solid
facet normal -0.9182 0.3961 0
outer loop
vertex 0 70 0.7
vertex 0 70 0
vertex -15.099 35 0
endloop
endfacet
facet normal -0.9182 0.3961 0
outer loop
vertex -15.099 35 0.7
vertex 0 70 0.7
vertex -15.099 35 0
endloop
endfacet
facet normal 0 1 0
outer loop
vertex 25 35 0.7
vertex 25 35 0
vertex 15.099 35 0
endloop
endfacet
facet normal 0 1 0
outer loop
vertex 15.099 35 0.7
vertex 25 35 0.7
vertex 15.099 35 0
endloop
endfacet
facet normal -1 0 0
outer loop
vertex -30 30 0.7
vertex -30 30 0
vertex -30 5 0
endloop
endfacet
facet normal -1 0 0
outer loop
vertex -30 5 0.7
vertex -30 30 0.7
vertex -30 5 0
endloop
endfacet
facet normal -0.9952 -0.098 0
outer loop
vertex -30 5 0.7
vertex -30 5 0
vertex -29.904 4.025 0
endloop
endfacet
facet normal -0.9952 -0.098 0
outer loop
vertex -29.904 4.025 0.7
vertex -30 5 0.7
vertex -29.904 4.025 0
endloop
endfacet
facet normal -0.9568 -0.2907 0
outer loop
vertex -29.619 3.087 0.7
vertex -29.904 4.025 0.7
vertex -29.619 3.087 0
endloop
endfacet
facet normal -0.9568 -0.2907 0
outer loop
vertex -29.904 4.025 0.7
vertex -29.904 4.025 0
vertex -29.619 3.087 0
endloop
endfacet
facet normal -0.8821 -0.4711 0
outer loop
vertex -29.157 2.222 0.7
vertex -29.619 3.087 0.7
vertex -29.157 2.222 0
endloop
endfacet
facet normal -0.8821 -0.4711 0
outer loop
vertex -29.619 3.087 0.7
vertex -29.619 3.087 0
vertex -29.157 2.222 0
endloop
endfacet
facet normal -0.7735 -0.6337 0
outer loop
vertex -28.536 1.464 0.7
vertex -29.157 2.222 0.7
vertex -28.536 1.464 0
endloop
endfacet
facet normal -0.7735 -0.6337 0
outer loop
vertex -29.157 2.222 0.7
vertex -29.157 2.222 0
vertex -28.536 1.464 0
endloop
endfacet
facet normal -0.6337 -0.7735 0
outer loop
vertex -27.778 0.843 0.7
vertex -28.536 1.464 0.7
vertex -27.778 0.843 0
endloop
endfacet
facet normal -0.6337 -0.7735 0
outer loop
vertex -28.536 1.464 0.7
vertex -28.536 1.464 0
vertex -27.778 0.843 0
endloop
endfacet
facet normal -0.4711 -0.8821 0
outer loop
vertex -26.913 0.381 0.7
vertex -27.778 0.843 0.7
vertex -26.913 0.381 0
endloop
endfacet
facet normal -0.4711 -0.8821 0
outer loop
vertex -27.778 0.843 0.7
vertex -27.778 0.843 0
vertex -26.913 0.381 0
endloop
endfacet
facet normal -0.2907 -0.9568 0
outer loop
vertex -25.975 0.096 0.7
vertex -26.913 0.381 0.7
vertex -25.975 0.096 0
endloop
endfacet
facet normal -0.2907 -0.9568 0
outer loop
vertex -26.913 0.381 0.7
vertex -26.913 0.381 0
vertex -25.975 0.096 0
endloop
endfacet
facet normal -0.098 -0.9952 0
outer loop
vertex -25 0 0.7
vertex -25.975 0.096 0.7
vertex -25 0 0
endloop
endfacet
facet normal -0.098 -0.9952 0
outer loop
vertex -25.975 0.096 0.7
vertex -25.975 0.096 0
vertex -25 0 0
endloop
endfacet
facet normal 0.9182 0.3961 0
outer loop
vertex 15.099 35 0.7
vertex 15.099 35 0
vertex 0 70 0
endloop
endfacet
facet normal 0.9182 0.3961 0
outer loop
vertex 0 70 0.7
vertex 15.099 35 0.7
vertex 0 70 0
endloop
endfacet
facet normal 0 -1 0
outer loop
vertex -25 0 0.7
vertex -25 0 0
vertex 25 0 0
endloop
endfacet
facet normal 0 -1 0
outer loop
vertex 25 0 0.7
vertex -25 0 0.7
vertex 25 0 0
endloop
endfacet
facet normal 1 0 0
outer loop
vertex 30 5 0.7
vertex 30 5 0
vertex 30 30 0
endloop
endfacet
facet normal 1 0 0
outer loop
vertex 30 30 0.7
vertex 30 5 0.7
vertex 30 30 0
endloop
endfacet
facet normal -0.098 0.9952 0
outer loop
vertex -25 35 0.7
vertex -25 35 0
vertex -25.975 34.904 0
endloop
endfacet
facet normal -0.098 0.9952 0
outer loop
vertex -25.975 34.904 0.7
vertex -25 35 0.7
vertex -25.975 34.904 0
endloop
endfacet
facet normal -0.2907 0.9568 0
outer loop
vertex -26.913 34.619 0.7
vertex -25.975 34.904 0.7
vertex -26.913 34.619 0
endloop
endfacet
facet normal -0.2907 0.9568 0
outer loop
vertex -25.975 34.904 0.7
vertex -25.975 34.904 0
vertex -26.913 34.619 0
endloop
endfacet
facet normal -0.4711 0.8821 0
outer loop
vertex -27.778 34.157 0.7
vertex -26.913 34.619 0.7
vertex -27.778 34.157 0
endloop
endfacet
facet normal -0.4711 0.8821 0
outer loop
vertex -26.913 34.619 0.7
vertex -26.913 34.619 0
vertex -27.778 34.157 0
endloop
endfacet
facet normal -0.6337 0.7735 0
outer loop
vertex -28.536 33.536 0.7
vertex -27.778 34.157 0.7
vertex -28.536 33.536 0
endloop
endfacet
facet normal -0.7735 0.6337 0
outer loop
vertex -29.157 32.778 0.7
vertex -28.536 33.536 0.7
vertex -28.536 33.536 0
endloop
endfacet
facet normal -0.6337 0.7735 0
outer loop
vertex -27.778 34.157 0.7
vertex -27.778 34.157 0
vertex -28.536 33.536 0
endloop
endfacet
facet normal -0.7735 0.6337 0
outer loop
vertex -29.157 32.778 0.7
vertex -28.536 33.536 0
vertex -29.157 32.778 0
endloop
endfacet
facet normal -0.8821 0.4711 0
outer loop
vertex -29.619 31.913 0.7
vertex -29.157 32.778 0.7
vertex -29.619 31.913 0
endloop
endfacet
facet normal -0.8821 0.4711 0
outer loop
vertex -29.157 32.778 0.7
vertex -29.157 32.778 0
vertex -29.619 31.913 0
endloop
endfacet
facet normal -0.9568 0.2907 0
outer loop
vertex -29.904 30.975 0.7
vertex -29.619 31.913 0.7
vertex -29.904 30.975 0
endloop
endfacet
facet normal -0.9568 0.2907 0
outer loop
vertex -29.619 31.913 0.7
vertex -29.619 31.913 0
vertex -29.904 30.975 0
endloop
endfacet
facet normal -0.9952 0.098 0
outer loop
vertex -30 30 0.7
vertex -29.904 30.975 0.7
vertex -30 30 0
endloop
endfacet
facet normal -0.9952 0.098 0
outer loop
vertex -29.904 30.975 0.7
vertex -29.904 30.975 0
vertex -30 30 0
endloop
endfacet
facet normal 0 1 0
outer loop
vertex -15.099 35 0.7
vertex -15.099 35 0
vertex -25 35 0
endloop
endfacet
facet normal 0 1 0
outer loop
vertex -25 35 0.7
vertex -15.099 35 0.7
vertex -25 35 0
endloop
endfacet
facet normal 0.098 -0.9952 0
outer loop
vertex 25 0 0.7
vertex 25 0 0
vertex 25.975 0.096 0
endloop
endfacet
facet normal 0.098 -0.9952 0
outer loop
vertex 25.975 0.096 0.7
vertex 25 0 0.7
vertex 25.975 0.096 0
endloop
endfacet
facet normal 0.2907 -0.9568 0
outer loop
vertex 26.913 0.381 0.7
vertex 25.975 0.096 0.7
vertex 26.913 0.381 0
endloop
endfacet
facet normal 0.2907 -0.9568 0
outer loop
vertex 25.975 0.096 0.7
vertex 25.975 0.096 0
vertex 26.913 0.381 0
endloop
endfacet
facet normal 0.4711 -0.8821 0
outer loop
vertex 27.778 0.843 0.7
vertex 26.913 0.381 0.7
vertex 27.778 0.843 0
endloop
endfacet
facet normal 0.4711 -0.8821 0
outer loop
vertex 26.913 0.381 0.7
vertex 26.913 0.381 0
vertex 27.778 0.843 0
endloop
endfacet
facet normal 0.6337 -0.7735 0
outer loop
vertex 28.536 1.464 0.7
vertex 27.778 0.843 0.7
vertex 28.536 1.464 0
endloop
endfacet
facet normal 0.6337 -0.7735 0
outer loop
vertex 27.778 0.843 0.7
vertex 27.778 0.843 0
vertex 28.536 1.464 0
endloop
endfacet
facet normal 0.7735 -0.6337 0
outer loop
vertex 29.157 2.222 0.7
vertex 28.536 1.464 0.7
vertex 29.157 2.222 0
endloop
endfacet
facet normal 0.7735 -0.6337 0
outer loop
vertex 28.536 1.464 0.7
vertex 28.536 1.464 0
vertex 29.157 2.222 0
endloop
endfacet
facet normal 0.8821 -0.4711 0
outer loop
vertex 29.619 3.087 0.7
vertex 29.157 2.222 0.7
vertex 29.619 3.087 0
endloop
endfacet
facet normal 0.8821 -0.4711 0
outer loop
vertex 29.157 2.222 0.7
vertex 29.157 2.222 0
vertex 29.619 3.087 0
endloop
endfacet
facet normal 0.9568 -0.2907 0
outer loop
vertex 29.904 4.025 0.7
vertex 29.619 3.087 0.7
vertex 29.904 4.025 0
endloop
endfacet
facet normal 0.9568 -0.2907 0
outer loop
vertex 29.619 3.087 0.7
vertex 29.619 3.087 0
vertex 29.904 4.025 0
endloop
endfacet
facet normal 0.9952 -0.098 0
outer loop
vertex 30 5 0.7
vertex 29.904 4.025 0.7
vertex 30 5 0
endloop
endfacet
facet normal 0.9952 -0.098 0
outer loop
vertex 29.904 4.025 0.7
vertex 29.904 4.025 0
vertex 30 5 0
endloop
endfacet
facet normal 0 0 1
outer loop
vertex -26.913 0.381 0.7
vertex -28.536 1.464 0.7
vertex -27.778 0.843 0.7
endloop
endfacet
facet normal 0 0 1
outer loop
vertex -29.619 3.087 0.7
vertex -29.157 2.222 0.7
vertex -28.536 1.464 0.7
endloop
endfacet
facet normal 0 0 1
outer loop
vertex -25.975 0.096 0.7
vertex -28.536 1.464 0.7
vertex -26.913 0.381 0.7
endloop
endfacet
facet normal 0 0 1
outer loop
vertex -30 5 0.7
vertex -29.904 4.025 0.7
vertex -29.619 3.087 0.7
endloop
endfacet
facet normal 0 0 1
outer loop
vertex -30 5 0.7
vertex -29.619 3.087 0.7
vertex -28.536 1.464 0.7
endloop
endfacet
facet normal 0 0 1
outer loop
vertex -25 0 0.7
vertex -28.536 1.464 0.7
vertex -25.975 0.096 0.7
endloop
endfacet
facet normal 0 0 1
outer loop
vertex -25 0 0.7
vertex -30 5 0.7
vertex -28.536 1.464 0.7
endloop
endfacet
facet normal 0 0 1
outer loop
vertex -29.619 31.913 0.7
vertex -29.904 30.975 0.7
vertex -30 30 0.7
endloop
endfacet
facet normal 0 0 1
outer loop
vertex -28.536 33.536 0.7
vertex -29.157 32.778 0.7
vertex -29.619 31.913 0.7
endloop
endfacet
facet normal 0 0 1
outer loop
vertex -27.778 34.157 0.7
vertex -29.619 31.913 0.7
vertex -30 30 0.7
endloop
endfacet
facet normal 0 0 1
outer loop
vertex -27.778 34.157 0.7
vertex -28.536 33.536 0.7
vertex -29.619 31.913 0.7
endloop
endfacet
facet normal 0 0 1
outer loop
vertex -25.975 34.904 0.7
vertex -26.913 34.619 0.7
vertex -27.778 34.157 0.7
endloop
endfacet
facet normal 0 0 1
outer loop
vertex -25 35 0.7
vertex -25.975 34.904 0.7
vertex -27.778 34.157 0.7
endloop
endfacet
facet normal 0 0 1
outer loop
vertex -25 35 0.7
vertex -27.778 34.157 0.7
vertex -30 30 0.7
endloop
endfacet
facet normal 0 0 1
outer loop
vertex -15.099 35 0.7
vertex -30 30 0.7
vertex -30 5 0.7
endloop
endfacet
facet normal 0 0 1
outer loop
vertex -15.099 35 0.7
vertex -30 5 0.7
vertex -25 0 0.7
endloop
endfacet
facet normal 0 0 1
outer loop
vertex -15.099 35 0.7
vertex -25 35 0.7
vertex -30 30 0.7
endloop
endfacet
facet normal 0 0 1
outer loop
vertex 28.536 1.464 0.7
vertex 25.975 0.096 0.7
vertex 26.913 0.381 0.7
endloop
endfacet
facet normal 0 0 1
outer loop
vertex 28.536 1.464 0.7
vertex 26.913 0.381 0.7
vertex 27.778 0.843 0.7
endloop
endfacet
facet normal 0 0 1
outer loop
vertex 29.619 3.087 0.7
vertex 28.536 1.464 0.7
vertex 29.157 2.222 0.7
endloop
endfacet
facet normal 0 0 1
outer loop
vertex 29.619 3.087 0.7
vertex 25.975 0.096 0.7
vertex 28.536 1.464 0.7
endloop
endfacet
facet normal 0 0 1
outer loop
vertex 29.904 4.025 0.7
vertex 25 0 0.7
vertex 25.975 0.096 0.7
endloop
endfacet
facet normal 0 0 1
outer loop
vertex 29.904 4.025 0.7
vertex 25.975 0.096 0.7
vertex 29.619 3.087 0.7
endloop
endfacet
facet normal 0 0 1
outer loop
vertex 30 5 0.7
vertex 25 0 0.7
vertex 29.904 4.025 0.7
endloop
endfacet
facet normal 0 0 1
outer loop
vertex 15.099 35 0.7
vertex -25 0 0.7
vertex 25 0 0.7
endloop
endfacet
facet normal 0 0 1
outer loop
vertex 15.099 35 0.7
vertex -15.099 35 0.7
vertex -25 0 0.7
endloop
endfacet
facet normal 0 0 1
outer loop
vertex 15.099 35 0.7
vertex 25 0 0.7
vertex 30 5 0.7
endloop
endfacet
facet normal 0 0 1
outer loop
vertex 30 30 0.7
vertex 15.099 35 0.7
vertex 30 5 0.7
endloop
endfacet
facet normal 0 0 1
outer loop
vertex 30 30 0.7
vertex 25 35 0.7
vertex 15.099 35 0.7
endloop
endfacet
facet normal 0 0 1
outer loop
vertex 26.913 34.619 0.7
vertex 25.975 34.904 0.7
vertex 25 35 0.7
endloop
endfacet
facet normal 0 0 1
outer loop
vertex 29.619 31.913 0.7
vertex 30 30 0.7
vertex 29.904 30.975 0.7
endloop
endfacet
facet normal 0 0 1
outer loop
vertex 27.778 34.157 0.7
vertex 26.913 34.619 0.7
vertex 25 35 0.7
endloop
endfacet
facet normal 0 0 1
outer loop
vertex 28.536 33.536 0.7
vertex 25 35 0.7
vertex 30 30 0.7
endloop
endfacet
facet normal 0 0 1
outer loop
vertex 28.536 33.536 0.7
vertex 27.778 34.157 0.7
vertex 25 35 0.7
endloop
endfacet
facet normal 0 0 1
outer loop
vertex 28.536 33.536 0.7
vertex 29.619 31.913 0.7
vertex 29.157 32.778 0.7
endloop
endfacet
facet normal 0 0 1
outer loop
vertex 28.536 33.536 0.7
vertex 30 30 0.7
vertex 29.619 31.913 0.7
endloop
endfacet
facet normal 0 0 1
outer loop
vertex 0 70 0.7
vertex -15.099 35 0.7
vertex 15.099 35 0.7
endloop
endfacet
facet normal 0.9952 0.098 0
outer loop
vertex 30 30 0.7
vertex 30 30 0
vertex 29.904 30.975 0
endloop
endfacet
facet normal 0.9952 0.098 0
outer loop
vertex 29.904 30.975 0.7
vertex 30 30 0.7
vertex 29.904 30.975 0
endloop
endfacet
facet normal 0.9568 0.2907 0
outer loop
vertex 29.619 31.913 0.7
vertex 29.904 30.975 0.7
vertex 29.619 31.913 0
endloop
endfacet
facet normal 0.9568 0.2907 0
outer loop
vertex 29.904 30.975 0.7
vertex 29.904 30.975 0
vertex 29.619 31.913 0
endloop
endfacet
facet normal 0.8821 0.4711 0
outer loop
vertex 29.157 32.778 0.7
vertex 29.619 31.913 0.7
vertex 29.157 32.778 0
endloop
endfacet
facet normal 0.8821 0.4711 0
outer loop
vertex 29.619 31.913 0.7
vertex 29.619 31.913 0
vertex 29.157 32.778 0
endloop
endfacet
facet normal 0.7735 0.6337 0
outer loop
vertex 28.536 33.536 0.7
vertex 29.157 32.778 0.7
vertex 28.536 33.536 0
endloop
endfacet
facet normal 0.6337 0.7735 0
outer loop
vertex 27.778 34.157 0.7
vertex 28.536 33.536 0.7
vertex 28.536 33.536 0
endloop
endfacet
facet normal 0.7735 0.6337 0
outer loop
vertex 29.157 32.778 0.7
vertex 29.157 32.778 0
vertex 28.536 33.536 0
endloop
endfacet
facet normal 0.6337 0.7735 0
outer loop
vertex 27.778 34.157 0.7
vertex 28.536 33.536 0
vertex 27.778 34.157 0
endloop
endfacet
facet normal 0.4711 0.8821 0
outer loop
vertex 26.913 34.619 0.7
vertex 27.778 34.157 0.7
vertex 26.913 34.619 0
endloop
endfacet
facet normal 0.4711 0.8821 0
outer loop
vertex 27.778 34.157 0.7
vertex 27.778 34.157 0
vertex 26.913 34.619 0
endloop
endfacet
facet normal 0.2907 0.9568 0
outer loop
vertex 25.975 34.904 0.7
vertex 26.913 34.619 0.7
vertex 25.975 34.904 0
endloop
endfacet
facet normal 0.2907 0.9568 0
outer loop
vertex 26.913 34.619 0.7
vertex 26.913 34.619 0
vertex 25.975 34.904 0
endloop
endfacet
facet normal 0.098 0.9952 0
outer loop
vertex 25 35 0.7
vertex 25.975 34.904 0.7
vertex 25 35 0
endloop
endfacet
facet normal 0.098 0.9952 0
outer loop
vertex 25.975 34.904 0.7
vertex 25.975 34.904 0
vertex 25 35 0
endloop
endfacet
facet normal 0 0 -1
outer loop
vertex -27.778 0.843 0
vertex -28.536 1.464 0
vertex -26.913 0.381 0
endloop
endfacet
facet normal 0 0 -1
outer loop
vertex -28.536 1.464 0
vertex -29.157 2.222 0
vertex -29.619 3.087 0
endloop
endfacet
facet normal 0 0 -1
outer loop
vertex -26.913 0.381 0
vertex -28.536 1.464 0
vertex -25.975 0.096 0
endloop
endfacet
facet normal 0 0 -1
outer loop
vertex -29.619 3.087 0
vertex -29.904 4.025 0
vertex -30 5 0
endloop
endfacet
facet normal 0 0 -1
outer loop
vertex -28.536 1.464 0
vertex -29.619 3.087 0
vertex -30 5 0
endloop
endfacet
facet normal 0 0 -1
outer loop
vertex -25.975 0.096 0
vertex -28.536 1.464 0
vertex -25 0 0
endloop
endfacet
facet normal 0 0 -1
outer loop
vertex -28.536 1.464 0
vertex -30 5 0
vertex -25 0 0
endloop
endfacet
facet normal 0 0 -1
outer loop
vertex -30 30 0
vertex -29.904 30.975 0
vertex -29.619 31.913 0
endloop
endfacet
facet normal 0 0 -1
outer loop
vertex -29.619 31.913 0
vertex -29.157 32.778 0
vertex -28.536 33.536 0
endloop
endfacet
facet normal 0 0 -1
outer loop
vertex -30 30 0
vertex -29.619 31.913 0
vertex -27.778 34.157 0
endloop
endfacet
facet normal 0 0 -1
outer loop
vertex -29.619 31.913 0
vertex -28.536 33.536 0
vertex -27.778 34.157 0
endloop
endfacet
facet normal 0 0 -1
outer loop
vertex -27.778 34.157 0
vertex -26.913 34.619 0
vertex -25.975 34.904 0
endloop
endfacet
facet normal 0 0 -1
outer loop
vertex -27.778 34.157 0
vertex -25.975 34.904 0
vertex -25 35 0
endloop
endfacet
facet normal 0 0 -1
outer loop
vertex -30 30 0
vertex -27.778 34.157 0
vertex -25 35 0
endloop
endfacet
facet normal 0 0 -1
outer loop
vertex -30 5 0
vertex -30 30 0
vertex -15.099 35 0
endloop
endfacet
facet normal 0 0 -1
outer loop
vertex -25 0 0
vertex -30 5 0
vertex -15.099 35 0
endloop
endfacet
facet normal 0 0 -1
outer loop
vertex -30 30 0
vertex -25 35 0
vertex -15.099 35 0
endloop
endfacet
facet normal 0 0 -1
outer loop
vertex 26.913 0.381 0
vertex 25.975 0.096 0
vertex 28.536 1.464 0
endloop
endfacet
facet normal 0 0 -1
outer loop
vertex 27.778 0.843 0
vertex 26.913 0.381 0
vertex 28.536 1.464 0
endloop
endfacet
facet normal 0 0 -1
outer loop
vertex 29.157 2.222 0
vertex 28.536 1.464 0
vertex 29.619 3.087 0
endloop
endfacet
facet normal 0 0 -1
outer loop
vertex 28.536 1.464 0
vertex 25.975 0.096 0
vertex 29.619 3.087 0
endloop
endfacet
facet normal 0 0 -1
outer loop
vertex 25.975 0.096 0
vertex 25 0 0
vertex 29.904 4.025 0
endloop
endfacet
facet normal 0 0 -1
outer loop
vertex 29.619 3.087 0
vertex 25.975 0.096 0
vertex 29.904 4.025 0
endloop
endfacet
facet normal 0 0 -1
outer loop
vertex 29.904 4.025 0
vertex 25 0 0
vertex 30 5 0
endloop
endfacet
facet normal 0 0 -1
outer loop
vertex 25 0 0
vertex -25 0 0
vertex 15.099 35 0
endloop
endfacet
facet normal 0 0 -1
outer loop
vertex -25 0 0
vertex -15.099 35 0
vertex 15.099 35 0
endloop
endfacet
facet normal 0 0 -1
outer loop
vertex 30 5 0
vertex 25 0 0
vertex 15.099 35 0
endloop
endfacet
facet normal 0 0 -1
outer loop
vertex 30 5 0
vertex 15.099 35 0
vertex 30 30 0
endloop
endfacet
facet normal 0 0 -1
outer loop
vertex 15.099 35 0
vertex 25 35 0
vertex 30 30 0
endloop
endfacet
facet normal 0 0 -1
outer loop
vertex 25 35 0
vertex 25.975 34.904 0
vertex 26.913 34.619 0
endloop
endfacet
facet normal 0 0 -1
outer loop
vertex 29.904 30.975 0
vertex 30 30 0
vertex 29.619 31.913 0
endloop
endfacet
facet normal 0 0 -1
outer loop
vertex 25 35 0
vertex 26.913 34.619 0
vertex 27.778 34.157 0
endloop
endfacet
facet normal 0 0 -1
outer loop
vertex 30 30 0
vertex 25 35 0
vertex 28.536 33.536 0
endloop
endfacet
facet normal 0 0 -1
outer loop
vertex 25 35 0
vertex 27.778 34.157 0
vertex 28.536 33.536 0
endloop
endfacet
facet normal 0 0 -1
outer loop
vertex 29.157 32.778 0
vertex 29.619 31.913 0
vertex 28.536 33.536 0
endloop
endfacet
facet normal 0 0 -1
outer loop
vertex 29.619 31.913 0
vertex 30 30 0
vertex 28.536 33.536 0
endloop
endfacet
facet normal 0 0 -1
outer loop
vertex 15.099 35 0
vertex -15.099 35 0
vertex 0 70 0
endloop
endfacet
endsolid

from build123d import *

# Parameters (mm, degrees)
F1_DEPTH = 0.7


with BuildPart() as f1:
    # F0 (on Top) → F1 (new body)
    with BuildSketch(Plane.XY):
        with BuildLine():
            Line((-25, 0), (0, 0))
            Line((0, 0), (25, 0))
            ThreePointArc((25, 0), (28.535534, 1.464466), (30, 5))
            Line((30, 5), (30, 30))
            ThreePointArc((30, 30), (28.535534, 33.535534), (25, 35))
            Line((25, 35), (15.099166, 35))
            Line((15.099166, 35), (0, 70))
            Line((0, 70), (-15.099166, 35))
            Line((-15.099166, 35), (-25, 35))
            ThreePointArc((-25, 35), (-28.535534, 33.535534), (-30, 30))
            Line((-30, 30), (-30, 5))
            ThreePointArc((-30, 5), (-28.535534, 1.464466), (-25, 0))
        make_face()
    extrude(amount=F1_DEPTH)


solid = f1.part
